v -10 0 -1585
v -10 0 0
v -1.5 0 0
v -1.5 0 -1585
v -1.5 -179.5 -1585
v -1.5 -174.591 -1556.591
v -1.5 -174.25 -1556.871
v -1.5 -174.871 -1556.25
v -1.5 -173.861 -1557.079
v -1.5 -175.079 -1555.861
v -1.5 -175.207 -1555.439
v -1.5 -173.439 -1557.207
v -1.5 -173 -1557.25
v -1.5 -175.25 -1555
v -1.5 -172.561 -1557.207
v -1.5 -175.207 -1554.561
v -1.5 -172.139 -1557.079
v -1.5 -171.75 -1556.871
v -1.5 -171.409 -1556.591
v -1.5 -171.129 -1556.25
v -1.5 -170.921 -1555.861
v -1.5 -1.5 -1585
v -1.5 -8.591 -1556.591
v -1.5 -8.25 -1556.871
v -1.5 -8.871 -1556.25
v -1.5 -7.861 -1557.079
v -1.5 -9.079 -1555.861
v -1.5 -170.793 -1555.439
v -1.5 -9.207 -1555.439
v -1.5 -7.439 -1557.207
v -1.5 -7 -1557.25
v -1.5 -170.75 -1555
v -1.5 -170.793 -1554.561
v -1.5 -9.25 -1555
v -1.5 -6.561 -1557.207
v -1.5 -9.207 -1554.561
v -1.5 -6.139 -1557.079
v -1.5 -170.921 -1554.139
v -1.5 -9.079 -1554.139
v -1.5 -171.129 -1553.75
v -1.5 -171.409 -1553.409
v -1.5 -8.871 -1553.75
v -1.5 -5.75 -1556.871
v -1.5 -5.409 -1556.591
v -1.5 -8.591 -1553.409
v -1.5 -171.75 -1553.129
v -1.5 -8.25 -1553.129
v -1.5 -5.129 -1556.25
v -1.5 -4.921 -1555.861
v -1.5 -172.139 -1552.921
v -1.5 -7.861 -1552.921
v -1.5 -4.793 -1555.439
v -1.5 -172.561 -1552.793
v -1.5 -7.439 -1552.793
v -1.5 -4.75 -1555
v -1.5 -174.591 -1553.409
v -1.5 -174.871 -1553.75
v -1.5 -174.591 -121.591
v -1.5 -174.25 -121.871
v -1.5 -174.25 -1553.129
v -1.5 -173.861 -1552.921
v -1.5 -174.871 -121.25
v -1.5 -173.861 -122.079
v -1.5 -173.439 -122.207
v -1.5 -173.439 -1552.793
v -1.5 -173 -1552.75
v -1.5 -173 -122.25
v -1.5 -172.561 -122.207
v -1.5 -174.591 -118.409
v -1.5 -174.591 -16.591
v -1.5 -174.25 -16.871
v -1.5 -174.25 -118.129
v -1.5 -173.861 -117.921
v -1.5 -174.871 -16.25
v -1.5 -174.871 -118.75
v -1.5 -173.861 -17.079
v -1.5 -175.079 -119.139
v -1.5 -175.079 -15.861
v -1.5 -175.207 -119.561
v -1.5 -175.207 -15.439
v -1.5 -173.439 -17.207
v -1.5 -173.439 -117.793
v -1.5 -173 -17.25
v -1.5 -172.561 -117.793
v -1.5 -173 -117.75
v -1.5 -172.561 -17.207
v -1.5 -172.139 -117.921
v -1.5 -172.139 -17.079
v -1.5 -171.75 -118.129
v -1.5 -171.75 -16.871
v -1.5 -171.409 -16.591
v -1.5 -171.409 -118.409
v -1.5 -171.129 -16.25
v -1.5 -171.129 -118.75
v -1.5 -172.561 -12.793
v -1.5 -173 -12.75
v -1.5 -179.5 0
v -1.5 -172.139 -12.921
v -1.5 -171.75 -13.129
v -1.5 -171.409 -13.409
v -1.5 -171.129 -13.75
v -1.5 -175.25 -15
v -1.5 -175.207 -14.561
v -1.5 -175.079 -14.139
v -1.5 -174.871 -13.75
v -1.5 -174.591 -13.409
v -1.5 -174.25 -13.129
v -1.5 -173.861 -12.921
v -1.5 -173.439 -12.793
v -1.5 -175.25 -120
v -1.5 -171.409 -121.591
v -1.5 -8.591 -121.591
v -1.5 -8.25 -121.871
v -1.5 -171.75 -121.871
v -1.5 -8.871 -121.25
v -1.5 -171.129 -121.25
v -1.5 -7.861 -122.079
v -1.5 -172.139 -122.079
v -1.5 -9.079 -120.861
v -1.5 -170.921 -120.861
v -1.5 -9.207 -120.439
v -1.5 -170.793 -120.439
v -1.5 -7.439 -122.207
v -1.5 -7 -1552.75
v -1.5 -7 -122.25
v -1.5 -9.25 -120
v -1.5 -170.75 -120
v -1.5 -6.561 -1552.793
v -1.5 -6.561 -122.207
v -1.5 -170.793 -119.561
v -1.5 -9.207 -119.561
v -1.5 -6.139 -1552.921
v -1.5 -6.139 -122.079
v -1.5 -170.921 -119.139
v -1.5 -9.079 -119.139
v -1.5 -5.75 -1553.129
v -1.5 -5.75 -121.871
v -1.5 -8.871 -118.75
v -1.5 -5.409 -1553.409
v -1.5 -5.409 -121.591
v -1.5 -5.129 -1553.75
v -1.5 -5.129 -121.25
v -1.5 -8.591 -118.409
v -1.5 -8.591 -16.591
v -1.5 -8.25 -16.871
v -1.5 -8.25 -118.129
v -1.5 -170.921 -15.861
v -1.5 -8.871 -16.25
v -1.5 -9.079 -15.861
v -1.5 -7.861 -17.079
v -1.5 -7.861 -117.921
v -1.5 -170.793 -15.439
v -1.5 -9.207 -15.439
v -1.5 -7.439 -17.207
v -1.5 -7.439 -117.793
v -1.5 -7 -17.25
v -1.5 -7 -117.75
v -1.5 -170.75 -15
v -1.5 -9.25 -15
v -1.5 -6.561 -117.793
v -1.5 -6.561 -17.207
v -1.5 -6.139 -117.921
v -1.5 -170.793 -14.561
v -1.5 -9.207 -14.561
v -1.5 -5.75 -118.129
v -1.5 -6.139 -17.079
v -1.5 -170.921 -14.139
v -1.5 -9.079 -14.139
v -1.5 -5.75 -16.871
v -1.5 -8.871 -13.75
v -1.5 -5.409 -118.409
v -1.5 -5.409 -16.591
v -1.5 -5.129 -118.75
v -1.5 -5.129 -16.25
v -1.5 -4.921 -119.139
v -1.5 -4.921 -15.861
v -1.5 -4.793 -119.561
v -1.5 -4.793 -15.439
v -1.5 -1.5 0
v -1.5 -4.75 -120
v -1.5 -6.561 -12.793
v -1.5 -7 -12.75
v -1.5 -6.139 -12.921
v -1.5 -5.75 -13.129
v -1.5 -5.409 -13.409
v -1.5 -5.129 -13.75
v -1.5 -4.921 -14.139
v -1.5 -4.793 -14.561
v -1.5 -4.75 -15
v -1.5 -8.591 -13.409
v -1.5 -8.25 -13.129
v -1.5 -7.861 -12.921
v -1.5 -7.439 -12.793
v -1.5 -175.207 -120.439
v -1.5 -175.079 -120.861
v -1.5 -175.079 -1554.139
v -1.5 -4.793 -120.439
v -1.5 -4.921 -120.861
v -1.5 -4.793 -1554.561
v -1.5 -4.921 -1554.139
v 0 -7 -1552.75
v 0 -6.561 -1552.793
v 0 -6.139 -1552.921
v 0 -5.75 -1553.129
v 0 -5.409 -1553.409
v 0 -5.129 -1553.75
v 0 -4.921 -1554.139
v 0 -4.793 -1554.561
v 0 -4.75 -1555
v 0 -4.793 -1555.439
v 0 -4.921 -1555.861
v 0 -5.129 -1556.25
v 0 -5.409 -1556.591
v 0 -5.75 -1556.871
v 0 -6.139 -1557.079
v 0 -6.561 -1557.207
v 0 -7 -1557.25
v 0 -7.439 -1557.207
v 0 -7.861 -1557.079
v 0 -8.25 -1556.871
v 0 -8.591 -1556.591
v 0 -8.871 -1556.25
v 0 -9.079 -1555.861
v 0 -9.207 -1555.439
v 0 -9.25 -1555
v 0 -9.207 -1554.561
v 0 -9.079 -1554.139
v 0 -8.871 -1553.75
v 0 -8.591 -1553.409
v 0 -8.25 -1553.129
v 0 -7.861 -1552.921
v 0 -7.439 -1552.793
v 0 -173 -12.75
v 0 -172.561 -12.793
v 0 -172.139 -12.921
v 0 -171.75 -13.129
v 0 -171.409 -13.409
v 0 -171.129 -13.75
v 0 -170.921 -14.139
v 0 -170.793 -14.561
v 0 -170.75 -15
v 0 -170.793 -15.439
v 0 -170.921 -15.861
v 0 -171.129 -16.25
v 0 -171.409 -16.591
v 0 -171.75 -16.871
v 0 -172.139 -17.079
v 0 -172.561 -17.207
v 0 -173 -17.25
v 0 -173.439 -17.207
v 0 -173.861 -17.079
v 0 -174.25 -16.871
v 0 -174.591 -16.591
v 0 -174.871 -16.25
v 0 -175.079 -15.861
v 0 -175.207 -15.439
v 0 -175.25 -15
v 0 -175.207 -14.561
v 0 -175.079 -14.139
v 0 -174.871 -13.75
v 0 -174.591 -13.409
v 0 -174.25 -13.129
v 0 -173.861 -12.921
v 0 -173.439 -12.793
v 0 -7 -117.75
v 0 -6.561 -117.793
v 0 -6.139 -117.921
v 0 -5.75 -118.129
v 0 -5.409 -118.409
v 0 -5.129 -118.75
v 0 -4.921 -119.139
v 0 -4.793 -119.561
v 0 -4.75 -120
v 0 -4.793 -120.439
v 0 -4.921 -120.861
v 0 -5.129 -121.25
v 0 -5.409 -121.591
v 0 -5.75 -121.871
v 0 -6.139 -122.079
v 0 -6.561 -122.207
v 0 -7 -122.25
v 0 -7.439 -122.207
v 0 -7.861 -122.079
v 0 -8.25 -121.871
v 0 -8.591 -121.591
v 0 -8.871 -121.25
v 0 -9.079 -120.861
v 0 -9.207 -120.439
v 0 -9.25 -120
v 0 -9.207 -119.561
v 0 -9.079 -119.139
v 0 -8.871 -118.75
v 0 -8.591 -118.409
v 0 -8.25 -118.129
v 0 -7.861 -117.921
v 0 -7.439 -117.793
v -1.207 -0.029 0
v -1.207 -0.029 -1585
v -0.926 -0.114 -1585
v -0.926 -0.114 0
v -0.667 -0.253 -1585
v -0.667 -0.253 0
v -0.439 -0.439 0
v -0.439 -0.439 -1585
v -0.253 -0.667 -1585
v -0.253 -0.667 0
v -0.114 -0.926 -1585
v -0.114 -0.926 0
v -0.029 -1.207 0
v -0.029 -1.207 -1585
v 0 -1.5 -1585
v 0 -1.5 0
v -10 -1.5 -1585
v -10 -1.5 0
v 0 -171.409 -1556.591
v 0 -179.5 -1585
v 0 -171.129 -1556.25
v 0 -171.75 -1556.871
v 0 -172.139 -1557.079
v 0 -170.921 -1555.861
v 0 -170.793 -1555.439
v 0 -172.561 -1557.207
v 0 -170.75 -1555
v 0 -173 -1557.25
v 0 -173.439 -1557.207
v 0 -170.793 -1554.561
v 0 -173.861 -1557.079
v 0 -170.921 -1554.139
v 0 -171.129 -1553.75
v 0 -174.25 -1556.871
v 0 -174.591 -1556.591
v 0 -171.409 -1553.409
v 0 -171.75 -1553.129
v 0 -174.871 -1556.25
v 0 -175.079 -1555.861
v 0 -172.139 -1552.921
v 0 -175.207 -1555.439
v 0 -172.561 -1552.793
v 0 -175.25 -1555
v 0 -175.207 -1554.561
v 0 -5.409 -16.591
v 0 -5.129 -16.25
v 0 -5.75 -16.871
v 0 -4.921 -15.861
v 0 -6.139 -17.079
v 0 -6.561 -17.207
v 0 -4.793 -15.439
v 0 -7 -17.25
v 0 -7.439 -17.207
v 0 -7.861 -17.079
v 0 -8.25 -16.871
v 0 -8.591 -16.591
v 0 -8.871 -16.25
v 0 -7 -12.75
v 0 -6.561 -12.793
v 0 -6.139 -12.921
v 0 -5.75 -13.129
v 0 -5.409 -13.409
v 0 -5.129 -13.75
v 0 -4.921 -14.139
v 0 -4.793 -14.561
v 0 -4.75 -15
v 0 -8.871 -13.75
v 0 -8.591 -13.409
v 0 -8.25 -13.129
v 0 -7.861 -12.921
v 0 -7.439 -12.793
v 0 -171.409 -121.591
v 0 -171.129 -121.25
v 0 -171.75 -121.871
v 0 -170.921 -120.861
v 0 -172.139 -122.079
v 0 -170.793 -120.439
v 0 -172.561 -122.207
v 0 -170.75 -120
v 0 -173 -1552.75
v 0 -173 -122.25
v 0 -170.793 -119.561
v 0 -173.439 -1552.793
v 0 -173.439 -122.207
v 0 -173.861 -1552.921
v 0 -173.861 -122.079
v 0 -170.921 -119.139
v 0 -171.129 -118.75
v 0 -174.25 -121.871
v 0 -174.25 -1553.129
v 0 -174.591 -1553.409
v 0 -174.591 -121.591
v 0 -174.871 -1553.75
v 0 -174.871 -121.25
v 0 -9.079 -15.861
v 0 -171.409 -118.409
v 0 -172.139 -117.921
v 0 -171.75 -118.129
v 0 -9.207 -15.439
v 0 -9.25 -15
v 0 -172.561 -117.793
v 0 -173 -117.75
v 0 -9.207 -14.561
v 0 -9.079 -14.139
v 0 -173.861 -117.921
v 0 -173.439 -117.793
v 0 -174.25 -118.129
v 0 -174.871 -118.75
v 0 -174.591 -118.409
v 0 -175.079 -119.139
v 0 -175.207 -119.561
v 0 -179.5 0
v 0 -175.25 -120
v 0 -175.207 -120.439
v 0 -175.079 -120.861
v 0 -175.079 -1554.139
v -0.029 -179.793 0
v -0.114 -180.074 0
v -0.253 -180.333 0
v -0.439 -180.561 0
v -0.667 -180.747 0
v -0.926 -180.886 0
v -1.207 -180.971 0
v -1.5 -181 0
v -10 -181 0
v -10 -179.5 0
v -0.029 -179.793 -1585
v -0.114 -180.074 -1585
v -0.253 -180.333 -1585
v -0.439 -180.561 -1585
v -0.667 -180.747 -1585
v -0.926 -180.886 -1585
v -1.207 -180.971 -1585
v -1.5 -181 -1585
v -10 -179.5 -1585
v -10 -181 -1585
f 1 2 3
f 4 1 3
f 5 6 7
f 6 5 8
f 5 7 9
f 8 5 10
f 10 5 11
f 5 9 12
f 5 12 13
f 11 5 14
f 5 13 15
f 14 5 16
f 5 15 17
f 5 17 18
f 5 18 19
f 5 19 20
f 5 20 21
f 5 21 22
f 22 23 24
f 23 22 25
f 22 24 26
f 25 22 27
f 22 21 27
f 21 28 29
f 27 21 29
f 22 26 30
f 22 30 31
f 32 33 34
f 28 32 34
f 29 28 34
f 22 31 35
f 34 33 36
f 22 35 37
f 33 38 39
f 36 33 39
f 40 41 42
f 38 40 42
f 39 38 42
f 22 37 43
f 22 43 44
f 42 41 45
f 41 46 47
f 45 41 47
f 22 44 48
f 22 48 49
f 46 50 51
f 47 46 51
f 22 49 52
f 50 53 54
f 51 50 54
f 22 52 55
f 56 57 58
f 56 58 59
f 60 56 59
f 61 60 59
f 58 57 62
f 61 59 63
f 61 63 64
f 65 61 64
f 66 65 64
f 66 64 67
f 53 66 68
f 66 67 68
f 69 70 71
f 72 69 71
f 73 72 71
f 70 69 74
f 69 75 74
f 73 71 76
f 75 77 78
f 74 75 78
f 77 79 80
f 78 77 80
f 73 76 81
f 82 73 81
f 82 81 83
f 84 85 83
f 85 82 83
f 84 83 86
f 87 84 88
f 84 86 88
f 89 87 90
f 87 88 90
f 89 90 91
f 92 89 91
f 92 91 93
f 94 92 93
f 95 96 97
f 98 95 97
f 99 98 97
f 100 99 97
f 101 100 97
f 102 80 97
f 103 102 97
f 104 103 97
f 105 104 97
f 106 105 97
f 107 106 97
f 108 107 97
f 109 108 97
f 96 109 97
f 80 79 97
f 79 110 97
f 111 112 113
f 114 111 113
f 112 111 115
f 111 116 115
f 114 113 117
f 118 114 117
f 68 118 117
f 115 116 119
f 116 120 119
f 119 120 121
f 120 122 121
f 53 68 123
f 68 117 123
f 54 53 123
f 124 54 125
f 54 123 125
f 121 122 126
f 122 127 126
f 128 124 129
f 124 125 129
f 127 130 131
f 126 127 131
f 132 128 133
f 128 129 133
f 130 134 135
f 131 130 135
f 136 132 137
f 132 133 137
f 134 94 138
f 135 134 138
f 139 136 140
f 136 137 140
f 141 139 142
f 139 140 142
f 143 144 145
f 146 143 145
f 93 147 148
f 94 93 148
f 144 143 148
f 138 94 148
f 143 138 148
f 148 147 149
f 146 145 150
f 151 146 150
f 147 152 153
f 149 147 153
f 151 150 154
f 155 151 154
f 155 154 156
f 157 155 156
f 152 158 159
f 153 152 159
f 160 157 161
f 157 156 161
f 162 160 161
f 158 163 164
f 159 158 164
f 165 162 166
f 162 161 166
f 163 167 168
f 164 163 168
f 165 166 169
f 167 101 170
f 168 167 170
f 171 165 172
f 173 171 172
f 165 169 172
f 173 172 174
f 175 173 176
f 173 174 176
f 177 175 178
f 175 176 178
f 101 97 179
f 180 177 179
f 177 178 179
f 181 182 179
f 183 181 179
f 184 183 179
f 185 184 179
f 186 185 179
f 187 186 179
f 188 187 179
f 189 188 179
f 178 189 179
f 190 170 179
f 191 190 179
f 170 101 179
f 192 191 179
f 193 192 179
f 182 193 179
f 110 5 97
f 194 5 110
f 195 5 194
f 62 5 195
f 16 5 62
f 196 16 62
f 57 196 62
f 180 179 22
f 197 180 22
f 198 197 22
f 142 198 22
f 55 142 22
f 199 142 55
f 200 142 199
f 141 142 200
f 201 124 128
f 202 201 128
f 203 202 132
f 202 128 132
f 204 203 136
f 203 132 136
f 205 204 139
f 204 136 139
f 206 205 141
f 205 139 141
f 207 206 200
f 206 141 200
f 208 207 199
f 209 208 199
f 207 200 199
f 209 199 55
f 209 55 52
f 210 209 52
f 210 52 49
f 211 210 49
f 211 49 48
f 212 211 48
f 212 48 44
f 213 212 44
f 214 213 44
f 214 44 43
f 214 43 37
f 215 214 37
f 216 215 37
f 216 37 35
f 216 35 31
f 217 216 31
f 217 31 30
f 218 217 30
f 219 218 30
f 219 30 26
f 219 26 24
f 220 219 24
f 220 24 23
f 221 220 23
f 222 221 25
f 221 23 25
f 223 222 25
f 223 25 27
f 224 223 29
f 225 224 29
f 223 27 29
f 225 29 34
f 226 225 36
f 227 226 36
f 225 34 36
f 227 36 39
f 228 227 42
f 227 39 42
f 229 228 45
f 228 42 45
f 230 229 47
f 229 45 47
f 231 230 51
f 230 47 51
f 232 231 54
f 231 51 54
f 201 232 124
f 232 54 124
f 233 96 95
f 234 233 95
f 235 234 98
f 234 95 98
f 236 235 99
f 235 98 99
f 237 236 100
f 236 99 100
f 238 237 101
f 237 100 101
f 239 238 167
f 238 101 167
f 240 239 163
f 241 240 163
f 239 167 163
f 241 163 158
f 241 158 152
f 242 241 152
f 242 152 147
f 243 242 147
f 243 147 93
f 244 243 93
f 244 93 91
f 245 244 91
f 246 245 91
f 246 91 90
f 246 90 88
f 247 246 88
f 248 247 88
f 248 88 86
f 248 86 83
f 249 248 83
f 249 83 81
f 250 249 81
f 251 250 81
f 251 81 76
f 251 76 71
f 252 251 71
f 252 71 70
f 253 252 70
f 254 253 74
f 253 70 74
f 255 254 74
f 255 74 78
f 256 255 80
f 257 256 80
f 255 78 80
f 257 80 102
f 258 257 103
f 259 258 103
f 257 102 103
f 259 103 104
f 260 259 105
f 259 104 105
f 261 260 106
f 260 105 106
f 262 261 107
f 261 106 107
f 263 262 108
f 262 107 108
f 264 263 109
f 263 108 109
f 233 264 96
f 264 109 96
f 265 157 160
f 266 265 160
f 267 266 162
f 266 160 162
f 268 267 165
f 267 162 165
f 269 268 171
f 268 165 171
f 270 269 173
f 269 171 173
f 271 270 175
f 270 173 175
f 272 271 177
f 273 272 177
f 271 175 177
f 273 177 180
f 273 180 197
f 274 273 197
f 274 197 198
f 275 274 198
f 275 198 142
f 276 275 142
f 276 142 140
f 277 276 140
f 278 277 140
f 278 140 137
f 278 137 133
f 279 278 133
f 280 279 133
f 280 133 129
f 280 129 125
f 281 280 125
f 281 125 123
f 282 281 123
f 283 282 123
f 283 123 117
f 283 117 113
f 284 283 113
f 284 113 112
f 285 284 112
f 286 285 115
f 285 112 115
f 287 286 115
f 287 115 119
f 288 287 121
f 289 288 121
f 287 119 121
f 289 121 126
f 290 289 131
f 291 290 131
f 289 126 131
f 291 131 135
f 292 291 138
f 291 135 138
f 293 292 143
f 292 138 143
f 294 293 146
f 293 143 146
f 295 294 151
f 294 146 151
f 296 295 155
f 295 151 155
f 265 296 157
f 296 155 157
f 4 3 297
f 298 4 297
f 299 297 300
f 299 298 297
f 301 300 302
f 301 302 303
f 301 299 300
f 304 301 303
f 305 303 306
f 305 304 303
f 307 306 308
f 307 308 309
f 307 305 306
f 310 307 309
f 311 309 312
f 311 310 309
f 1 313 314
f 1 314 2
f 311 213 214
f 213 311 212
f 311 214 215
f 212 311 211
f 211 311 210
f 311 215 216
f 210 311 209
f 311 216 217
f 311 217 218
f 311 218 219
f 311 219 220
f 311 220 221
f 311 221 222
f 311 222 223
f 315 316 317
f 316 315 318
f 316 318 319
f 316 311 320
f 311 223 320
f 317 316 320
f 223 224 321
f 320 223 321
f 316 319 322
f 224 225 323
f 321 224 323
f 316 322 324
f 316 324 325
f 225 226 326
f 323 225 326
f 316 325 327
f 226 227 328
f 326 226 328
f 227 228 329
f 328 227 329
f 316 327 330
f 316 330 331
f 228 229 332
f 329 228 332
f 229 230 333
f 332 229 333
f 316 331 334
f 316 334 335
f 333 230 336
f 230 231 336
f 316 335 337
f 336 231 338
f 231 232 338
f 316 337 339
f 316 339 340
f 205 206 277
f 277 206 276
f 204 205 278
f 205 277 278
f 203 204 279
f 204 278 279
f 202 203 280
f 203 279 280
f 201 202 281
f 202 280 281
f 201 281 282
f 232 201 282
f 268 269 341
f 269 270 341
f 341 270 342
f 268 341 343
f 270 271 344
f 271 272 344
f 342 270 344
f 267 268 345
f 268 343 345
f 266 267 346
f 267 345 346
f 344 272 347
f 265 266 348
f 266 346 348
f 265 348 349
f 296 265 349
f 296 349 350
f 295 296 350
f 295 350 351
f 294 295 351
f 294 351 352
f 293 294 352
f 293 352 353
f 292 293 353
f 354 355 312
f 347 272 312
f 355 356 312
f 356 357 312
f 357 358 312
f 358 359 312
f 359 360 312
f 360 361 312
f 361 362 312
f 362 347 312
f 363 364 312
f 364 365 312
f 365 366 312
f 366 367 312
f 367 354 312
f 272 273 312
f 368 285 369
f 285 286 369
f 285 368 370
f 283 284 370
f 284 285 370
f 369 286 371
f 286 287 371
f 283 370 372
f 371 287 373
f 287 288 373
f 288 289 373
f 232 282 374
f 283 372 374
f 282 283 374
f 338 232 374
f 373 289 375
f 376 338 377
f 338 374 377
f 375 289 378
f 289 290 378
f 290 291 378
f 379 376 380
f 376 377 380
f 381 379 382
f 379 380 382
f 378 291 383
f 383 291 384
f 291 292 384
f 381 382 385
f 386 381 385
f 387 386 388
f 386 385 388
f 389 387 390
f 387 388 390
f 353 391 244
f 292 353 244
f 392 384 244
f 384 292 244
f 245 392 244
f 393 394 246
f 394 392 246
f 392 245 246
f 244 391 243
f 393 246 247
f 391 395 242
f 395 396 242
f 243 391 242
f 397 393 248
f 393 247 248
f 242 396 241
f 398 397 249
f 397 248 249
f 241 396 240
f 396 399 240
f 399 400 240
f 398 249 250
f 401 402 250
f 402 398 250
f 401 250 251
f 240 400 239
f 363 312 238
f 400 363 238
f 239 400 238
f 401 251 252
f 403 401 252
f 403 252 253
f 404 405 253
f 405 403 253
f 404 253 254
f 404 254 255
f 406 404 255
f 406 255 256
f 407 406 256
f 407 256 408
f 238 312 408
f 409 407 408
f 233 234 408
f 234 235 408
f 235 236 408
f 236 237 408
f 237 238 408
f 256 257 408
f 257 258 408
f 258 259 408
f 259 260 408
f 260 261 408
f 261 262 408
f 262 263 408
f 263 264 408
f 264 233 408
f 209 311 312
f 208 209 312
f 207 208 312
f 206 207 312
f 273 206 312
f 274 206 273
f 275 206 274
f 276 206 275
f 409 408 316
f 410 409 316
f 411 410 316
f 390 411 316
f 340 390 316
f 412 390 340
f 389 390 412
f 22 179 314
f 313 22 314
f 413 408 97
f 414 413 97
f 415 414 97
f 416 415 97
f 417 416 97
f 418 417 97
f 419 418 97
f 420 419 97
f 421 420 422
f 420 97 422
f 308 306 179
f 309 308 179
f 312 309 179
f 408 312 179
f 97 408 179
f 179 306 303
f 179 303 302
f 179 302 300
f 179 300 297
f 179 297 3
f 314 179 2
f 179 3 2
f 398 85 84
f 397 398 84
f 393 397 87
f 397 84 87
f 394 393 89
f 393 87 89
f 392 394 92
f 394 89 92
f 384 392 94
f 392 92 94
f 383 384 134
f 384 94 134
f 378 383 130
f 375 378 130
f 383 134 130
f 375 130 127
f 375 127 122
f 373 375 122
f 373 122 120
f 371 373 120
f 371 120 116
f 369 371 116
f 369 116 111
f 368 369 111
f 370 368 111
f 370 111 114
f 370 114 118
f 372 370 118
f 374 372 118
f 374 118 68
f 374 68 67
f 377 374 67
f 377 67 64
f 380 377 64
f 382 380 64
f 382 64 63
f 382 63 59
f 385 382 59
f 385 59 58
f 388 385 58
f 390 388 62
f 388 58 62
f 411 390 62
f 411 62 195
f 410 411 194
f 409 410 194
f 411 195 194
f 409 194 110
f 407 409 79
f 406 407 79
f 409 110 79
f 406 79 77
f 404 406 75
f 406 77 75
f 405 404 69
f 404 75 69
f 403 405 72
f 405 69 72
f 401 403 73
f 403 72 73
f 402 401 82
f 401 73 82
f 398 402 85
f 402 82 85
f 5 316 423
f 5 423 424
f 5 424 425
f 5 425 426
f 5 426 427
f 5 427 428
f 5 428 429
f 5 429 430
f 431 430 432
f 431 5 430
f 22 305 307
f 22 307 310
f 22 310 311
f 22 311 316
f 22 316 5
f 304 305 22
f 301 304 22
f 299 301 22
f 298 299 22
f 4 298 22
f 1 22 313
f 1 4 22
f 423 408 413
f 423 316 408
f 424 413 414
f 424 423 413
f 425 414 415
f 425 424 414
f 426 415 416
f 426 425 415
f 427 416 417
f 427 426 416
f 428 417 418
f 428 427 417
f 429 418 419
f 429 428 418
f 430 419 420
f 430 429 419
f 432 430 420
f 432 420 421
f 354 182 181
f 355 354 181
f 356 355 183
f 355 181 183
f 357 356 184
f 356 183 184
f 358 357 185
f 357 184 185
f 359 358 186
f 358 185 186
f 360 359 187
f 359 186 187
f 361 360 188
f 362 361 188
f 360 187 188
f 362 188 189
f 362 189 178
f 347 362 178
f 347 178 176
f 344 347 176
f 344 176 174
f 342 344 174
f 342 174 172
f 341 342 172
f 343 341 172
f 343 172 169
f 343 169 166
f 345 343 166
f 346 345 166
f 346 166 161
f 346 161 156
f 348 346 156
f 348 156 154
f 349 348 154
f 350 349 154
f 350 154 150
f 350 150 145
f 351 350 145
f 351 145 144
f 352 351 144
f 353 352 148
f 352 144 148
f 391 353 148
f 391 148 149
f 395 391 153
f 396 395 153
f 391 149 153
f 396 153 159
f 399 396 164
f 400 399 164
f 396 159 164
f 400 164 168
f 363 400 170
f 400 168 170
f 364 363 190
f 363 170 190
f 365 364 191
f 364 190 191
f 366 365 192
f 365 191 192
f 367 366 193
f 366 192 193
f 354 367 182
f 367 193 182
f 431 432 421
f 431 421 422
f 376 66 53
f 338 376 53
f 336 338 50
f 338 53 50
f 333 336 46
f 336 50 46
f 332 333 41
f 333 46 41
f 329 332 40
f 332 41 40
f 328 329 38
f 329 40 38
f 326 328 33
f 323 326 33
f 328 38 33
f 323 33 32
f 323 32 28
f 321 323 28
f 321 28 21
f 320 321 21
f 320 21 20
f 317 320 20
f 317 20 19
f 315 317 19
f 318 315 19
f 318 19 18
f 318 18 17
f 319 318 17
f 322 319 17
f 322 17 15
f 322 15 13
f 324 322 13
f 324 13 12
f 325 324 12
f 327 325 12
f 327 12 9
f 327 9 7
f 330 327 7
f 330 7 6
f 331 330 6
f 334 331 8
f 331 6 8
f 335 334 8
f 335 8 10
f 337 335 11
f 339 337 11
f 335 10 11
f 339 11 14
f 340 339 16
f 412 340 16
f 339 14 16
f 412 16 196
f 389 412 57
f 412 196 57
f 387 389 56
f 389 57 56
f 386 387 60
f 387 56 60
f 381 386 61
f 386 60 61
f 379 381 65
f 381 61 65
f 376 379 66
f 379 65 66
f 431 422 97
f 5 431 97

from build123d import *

# Parameters (mm, degrees)
BOSS_EXTRUDE1_DEPTH            = 1585
FILLET1_R                      = 1.5
F_4_5_4_5_DIAMETER_HOLE1_D     = 4.5
F_4_5_4_5_DIAMETER_HOLE1_DEPTH = 1.5
LPATTERN2_COUNT                = 2
LPATTERN2_PITCH                = 166


with BuildPart() as part:
    # Sketch1 → Boss-Extrude1 (new body)
    with BuildSketch(Plane.XY):
        Polygon((-10, -1.5), (-10, 0), (0, 0), (0, -181), (-10, -181), (-10, -179.5), (-1.5, -179.5), (-1.5, -1.5), align=None)
    extrude(amount=-BOSS_EXTRUDE1_DEPTH)

    # Fillet1
    fillet1_edges = [part.edges().sort_by_distance(p)[0] for p in [
        (0, -181, -792.5),
        (0, 0, -792.5),
    ]]
    fillet(fillet1_edges, radius=FILLET1_R)

    # Ø4.5 (4.5) Diameter Hole1
    with Locations(Plane(origin=(0, 0, 0), x_dir=(0, 0, -1), z_dir=(1, 0, 0))):
        with Locations((15, -7), (120, -7), (1555, -7)):
            f_4_5_4_5_diameter_hole1 = Hole(F_4_5_4_5_DIAMETER_HOLE1_D / 2, depth=F_4_5_4_5_DIAMETER_HOLE1_DEPTH)

    # LPattern2: Ø4.5 (4.5) Diameter Hole1 ×2
    with Locations(*[(0, -i * LPATTERN2_PITCH, 0) for i in range(1, LPATTERN2_COUNT)]):
        add(f_4_5_4_5_diameter_hole1, mode=Mode.SUBTRACT)


solid = part.part
